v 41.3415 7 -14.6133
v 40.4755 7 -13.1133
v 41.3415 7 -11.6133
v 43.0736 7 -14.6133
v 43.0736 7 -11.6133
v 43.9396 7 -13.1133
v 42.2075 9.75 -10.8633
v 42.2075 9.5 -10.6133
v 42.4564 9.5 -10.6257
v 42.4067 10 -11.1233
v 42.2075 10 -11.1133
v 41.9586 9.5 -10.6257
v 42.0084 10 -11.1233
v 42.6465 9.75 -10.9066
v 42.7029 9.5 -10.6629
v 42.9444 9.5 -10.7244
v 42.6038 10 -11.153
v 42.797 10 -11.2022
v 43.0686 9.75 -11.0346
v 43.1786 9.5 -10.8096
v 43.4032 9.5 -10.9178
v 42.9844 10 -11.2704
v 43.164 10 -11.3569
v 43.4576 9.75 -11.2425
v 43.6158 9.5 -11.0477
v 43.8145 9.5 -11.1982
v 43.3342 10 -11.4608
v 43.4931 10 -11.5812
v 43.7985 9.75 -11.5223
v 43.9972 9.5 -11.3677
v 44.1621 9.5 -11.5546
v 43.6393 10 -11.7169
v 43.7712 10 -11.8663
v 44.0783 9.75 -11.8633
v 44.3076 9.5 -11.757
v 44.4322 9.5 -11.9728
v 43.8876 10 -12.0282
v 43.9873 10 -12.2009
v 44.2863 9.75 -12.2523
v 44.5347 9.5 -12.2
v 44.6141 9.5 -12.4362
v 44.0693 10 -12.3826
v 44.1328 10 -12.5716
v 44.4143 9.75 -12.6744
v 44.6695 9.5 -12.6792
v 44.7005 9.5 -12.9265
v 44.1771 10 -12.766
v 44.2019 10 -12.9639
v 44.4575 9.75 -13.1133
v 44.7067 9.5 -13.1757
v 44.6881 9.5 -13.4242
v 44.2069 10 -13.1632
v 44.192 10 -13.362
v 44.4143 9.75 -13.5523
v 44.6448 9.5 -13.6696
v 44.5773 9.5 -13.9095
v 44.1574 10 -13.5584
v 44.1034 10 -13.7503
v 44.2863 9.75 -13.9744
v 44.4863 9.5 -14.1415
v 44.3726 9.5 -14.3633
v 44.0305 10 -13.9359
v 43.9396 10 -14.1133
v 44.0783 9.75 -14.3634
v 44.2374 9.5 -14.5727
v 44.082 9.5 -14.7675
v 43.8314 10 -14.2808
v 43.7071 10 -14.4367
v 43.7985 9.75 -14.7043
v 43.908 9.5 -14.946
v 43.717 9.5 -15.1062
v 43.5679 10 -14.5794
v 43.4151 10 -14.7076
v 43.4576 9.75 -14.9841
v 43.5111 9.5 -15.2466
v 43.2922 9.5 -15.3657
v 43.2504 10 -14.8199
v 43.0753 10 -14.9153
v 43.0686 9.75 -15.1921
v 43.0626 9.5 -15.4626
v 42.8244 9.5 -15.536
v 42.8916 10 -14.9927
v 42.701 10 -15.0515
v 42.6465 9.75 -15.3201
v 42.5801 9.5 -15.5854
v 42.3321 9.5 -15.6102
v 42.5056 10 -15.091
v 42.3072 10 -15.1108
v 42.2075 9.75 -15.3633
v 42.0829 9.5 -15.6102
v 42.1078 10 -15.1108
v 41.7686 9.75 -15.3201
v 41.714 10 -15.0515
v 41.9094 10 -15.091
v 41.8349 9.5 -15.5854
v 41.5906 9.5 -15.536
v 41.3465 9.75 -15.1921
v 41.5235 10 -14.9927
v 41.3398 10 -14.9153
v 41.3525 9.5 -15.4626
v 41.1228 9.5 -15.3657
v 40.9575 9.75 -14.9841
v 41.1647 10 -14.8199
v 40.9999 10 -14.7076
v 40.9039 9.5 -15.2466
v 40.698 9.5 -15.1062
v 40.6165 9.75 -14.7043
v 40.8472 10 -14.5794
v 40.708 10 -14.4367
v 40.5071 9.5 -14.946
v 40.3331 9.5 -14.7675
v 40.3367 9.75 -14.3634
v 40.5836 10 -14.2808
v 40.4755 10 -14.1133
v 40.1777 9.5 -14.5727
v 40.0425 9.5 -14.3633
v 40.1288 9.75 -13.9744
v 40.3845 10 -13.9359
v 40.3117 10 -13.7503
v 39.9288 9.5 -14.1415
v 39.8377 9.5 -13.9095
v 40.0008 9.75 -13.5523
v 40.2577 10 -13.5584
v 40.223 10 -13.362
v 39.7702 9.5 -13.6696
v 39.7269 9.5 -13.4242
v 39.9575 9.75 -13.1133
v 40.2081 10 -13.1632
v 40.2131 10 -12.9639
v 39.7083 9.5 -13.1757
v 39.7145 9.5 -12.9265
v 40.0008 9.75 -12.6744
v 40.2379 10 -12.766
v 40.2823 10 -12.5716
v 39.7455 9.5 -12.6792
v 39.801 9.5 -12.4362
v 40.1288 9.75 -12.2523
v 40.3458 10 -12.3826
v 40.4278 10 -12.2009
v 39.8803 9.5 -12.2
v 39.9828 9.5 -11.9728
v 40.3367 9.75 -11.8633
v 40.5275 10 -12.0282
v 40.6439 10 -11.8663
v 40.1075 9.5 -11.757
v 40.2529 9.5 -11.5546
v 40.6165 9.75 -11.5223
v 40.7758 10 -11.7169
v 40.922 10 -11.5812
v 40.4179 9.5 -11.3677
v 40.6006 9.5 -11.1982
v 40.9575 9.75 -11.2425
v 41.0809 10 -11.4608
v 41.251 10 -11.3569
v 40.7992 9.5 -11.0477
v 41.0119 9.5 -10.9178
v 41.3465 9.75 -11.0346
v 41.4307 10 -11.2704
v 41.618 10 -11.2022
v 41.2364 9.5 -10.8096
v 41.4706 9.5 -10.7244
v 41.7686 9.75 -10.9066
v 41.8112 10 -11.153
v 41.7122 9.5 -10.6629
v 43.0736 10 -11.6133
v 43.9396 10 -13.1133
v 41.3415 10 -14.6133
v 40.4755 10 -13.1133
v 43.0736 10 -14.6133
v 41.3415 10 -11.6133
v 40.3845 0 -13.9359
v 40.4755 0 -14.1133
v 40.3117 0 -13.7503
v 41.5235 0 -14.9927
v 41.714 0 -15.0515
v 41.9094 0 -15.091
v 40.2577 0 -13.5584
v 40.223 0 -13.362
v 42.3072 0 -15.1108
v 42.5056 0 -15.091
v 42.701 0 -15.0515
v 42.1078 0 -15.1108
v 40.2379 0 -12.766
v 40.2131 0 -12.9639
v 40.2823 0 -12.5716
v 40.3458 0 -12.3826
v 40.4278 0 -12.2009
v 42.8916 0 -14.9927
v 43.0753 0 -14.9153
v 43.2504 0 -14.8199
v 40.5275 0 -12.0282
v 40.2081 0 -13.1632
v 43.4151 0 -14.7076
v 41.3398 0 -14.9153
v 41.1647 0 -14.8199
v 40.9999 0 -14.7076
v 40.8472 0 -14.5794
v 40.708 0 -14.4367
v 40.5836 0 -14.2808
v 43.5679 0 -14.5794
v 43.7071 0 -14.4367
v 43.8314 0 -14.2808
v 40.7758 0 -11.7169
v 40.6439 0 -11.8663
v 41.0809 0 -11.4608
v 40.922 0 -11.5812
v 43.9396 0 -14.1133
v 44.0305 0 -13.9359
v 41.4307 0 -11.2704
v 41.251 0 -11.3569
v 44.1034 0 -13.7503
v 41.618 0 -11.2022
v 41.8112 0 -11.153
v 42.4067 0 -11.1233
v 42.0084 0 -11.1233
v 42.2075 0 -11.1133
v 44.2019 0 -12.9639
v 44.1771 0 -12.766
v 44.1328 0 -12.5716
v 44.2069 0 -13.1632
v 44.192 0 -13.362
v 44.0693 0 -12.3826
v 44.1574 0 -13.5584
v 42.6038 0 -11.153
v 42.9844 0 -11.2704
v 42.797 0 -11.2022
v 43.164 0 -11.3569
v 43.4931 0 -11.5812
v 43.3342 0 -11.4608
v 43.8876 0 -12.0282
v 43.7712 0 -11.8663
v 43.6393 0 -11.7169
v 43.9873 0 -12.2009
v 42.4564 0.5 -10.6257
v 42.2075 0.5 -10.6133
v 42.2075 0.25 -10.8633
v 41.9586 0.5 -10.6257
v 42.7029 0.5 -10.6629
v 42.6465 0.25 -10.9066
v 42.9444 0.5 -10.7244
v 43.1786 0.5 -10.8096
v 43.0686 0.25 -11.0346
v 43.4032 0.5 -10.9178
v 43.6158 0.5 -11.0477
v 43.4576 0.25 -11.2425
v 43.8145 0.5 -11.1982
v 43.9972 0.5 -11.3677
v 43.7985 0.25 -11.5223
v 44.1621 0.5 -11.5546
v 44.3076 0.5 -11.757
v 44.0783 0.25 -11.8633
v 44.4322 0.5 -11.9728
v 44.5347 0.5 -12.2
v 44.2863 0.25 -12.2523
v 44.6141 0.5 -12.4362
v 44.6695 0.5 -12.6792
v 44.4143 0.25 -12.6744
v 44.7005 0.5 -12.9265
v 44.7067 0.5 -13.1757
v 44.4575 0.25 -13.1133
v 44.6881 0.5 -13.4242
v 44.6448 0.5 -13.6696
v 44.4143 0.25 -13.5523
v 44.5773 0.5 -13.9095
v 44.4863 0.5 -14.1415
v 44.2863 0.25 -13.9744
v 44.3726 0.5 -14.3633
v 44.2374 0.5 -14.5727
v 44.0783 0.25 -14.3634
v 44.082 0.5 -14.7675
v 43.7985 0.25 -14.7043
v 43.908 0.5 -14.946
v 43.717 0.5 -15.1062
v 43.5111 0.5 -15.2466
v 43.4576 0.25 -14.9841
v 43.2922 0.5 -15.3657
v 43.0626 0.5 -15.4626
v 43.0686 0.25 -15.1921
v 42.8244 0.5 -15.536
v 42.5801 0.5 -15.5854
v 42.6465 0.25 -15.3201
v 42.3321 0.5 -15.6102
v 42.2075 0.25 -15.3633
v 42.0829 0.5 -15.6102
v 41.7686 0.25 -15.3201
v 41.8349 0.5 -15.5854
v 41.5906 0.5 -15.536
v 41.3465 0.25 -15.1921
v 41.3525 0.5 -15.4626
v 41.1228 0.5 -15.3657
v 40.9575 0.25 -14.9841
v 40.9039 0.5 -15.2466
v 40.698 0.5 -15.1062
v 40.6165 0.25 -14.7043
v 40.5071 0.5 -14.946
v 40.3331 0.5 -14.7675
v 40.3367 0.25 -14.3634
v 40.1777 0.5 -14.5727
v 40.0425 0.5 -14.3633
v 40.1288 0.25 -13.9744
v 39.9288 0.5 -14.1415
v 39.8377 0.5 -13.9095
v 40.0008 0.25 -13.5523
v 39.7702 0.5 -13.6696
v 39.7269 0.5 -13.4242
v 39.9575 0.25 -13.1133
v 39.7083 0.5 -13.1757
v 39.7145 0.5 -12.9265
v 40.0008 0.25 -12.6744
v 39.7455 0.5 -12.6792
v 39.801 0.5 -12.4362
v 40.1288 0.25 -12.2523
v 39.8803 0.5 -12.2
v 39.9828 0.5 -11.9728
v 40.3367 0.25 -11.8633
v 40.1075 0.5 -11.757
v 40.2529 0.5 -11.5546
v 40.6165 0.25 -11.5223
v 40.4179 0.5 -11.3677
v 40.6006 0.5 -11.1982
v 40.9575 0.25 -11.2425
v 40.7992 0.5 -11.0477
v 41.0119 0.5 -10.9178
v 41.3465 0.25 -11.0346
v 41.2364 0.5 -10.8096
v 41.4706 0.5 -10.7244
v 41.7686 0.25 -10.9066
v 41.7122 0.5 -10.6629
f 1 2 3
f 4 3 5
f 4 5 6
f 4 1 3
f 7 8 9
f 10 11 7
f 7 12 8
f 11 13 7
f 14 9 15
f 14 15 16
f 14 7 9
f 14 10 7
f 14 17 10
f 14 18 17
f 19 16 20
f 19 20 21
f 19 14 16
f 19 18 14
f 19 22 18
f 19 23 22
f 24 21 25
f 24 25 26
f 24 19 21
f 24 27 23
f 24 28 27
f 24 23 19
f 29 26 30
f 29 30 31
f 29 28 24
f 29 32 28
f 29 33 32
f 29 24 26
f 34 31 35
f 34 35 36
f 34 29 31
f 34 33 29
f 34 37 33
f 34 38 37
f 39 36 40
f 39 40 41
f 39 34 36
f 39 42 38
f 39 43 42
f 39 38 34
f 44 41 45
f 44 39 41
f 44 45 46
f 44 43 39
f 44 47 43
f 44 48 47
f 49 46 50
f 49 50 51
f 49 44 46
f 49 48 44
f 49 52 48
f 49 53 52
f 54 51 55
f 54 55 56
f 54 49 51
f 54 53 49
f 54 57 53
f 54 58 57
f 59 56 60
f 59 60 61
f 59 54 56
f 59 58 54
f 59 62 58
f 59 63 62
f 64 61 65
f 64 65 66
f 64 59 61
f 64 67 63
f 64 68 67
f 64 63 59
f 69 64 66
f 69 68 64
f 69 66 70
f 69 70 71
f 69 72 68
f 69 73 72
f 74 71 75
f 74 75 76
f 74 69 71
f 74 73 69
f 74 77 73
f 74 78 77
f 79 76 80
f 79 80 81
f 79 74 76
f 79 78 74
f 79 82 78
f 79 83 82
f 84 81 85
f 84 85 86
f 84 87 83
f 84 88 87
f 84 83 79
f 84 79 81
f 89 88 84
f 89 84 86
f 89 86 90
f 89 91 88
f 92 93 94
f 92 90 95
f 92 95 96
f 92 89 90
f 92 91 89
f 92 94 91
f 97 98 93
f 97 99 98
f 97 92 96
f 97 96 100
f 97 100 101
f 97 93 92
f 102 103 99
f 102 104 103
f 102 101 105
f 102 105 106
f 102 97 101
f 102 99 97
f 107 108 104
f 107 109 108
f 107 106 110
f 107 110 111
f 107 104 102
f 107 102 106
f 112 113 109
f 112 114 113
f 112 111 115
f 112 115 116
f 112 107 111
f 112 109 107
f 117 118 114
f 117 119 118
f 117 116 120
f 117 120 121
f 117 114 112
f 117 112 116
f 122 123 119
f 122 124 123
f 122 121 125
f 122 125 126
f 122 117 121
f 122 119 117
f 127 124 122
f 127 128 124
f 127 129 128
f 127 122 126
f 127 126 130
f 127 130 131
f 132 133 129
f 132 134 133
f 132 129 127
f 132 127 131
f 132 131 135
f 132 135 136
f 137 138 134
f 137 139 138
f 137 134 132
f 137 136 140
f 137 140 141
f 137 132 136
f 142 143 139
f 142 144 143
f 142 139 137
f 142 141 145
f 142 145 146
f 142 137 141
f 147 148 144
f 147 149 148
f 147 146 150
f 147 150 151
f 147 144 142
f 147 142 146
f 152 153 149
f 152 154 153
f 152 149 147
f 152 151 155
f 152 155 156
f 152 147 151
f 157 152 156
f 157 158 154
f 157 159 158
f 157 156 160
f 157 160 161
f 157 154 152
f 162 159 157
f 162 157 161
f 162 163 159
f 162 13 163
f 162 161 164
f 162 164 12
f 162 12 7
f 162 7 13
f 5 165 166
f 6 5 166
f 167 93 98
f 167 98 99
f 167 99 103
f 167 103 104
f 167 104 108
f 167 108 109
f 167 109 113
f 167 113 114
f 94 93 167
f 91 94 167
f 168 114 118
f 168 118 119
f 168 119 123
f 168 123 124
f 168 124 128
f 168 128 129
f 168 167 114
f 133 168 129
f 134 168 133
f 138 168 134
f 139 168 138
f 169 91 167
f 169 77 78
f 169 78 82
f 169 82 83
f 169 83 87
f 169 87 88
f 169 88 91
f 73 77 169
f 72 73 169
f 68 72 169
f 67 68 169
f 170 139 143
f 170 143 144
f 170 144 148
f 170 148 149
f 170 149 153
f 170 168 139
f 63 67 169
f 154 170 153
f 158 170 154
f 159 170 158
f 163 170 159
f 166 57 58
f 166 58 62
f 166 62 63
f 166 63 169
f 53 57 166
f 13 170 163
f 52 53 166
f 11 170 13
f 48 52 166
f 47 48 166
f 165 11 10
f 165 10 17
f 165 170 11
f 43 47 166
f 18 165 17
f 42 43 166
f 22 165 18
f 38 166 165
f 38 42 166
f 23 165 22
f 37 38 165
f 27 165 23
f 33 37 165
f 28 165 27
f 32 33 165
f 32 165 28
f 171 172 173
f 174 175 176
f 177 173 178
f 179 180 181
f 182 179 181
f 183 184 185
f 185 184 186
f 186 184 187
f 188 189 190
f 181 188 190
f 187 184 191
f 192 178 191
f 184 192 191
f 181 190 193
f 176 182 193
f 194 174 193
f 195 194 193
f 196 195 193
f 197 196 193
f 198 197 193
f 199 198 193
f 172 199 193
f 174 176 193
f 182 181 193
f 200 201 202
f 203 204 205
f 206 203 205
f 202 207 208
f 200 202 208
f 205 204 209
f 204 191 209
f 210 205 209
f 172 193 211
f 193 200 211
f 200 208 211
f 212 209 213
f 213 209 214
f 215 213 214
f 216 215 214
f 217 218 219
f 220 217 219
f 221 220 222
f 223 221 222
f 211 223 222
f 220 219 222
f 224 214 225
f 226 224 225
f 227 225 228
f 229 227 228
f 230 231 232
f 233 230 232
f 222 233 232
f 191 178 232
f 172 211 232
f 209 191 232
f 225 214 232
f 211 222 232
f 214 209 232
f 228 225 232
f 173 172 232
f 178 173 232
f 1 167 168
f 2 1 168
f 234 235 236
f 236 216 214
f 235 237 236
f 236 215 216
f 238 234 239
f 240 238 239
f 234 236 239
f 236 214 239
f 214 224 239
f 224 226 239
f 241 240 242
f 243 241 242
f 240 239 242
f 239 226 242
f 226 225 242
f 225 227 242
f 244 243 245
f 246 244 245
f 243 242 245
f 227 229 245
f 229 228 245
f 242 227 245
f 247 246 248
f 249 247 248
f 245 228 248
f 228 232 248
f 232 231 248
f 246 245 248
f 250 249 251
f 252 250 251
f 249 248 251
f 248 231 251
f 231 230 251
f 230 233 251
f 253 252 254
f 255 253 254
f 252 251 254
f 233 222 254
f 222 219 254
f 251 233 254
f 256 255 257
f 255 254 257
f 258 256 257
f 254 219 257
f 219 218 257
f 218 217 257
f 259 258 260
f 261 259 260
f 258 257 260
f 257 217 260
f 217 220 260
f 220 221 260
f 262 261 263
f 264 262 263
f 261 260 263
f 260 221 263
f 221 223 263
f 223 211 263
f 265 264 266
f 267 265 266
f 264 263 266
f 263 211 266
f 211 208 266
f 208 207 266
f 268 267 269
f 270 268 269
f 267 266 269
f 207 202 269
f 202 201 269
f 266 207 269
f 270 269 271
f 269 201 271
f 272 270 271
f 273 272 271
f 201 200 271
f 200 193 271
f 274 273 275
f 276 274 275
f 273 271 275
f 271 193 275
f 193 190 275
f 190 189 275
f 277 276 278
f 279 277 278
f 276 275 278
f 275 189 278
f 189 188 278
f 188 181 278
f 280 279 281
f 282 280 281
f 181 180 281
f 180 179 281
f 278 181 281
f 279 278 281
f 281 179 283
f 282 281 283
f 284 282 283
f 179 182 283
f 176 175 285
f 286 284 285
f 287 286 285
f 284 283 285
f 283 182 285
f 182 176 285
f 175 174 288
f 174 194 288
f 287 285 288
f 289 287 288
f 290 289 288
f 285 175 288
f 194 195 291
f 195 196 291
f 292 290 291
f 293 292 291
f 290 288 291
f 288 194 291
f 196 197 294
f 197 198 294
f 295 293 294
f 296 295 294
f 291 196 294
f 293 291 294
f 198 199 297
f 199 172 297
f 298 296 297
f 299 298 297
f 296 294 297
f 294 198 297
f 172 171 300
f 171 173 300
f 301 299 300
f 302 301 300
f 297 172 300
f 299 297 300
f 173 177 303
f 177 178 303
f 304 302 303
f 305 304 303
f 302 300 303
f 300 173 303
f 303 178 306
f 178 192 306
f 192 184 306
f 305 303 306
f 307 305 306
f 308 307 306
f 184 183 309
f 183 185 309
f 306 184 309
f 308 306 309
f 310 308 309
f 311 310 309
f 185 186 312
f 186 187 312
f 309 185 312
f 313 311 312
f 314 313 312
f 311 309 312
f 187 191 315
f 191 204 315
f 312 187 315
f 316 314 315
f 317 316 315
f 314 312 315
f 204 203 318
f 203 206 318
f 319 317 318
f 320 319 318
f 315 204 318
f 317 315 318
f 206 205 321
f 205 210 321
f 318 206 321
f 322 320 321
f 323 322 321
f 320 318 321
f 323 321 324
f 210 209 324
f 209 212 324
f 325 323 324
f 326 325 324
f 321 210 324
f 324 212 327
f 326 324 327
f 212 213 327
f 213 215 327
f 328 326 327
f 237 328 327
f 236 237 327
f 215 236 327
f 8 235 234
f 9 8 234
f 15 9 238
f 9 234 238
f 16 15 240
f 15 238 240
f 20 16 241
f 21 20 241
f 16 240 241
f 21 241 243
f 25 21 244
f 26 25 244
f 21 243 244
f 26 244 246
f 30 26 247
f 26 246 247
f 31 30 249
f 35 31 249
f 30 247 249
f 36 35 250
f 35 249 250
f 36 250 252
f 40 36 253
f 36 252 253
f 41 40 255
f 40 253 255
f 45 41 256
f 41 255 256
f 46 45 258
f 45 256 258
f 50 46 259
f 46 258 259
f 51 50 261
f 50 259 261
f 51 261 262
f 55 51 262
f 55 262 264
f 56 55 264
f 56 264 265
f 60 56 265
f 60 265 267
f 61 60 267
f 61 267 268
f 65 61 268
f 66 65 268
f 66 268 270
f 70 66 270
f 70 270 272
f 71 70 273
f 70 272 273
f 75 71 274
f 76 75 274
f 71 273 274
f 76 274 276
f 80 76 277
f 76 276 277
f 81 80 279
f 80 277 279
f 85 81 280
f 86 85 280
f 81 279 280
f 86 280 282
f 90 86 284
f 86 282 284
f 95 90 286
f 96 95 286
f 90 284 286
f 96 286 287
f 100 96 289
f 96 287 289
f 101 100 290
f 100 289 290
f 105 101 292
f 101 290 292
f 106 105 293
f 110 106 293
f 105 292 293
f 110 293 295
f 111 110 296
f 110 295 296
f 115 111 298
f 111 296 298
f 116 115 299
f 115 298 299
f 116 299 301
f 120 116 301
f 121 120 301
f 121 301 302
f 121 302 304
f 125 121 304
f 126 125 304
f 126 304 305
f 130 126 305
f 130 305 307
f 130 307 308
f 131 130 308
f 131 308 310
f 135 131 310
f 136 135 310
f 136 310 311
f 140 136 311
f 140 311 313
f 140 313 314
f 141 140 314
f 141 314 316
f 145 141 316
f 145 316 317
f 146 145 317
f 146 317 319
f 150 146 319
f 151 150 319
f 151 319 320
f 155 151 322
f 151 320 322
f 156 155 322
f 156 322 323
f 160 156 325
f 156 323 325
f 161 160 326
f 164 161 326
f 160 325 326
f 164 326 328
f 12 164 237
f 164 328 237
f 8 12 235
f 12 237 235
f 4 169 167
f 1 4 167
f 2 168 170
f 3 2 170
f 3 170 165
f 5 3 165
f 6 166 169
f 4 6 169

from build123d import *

# Parameters (mm, degrees)
SZKIC1_R                    = 2.5
DODANIE_WYCI_GNI_CIE1_DEPTH = 10
WYTNIJ_WYCI_GNI_CIE1_DEPTH  = 3
SFAZOWANIE1_SIZE            = 0.5


with BuildPart() as part:
    # Szkic1 → Dodanie-wyciągnięcie1 (new body)
    with BuildSketch(Plane(origin=(0, 0, 0), x_dir=(1, 0, 0), z_dir=(0, 1, 0))):
        with Locations(Location((42.20752559, 13.113324094, 0), (0, 0, 270))):
            Circle(SZKIC1_R)
    extrude(amount=DODANIE_WYCI_GNI_CIE1_DEPTH)

    # Szkic2 → Wytnij-wyciągnięcie1 (cut)
    with BuildSketch(Plane(origin=(0, 10, 0), x_dir=(1, 0, 0), z_dir=(0, 1, 0))):
        Polygon((43.939576398, 13.113324094), (43.073550994, 14.613324094), (41.341500186, 14.613324094), (40.475474782, 13.113324094), (41.341500186, 11.613324094), (43.073550994, 11.613324094), align=None)
    extrude(amount=-WYTNIJ_WYCI_GNI_CIE1_DEPTH, mode=Mode.SUBTRACT)

    # Sfazowanie1
    sfazowanie1_edges = [part.edges().sort_by_distance(p)[0] for p in [
        (42.20752559, 0, -15.613324094),
        (42.20752559, 10, -15.613324094),
    ]]
    chamfer(sfazowanie1_edges, length=SFAZOWANIE1_SIZE)


solid = part.part
